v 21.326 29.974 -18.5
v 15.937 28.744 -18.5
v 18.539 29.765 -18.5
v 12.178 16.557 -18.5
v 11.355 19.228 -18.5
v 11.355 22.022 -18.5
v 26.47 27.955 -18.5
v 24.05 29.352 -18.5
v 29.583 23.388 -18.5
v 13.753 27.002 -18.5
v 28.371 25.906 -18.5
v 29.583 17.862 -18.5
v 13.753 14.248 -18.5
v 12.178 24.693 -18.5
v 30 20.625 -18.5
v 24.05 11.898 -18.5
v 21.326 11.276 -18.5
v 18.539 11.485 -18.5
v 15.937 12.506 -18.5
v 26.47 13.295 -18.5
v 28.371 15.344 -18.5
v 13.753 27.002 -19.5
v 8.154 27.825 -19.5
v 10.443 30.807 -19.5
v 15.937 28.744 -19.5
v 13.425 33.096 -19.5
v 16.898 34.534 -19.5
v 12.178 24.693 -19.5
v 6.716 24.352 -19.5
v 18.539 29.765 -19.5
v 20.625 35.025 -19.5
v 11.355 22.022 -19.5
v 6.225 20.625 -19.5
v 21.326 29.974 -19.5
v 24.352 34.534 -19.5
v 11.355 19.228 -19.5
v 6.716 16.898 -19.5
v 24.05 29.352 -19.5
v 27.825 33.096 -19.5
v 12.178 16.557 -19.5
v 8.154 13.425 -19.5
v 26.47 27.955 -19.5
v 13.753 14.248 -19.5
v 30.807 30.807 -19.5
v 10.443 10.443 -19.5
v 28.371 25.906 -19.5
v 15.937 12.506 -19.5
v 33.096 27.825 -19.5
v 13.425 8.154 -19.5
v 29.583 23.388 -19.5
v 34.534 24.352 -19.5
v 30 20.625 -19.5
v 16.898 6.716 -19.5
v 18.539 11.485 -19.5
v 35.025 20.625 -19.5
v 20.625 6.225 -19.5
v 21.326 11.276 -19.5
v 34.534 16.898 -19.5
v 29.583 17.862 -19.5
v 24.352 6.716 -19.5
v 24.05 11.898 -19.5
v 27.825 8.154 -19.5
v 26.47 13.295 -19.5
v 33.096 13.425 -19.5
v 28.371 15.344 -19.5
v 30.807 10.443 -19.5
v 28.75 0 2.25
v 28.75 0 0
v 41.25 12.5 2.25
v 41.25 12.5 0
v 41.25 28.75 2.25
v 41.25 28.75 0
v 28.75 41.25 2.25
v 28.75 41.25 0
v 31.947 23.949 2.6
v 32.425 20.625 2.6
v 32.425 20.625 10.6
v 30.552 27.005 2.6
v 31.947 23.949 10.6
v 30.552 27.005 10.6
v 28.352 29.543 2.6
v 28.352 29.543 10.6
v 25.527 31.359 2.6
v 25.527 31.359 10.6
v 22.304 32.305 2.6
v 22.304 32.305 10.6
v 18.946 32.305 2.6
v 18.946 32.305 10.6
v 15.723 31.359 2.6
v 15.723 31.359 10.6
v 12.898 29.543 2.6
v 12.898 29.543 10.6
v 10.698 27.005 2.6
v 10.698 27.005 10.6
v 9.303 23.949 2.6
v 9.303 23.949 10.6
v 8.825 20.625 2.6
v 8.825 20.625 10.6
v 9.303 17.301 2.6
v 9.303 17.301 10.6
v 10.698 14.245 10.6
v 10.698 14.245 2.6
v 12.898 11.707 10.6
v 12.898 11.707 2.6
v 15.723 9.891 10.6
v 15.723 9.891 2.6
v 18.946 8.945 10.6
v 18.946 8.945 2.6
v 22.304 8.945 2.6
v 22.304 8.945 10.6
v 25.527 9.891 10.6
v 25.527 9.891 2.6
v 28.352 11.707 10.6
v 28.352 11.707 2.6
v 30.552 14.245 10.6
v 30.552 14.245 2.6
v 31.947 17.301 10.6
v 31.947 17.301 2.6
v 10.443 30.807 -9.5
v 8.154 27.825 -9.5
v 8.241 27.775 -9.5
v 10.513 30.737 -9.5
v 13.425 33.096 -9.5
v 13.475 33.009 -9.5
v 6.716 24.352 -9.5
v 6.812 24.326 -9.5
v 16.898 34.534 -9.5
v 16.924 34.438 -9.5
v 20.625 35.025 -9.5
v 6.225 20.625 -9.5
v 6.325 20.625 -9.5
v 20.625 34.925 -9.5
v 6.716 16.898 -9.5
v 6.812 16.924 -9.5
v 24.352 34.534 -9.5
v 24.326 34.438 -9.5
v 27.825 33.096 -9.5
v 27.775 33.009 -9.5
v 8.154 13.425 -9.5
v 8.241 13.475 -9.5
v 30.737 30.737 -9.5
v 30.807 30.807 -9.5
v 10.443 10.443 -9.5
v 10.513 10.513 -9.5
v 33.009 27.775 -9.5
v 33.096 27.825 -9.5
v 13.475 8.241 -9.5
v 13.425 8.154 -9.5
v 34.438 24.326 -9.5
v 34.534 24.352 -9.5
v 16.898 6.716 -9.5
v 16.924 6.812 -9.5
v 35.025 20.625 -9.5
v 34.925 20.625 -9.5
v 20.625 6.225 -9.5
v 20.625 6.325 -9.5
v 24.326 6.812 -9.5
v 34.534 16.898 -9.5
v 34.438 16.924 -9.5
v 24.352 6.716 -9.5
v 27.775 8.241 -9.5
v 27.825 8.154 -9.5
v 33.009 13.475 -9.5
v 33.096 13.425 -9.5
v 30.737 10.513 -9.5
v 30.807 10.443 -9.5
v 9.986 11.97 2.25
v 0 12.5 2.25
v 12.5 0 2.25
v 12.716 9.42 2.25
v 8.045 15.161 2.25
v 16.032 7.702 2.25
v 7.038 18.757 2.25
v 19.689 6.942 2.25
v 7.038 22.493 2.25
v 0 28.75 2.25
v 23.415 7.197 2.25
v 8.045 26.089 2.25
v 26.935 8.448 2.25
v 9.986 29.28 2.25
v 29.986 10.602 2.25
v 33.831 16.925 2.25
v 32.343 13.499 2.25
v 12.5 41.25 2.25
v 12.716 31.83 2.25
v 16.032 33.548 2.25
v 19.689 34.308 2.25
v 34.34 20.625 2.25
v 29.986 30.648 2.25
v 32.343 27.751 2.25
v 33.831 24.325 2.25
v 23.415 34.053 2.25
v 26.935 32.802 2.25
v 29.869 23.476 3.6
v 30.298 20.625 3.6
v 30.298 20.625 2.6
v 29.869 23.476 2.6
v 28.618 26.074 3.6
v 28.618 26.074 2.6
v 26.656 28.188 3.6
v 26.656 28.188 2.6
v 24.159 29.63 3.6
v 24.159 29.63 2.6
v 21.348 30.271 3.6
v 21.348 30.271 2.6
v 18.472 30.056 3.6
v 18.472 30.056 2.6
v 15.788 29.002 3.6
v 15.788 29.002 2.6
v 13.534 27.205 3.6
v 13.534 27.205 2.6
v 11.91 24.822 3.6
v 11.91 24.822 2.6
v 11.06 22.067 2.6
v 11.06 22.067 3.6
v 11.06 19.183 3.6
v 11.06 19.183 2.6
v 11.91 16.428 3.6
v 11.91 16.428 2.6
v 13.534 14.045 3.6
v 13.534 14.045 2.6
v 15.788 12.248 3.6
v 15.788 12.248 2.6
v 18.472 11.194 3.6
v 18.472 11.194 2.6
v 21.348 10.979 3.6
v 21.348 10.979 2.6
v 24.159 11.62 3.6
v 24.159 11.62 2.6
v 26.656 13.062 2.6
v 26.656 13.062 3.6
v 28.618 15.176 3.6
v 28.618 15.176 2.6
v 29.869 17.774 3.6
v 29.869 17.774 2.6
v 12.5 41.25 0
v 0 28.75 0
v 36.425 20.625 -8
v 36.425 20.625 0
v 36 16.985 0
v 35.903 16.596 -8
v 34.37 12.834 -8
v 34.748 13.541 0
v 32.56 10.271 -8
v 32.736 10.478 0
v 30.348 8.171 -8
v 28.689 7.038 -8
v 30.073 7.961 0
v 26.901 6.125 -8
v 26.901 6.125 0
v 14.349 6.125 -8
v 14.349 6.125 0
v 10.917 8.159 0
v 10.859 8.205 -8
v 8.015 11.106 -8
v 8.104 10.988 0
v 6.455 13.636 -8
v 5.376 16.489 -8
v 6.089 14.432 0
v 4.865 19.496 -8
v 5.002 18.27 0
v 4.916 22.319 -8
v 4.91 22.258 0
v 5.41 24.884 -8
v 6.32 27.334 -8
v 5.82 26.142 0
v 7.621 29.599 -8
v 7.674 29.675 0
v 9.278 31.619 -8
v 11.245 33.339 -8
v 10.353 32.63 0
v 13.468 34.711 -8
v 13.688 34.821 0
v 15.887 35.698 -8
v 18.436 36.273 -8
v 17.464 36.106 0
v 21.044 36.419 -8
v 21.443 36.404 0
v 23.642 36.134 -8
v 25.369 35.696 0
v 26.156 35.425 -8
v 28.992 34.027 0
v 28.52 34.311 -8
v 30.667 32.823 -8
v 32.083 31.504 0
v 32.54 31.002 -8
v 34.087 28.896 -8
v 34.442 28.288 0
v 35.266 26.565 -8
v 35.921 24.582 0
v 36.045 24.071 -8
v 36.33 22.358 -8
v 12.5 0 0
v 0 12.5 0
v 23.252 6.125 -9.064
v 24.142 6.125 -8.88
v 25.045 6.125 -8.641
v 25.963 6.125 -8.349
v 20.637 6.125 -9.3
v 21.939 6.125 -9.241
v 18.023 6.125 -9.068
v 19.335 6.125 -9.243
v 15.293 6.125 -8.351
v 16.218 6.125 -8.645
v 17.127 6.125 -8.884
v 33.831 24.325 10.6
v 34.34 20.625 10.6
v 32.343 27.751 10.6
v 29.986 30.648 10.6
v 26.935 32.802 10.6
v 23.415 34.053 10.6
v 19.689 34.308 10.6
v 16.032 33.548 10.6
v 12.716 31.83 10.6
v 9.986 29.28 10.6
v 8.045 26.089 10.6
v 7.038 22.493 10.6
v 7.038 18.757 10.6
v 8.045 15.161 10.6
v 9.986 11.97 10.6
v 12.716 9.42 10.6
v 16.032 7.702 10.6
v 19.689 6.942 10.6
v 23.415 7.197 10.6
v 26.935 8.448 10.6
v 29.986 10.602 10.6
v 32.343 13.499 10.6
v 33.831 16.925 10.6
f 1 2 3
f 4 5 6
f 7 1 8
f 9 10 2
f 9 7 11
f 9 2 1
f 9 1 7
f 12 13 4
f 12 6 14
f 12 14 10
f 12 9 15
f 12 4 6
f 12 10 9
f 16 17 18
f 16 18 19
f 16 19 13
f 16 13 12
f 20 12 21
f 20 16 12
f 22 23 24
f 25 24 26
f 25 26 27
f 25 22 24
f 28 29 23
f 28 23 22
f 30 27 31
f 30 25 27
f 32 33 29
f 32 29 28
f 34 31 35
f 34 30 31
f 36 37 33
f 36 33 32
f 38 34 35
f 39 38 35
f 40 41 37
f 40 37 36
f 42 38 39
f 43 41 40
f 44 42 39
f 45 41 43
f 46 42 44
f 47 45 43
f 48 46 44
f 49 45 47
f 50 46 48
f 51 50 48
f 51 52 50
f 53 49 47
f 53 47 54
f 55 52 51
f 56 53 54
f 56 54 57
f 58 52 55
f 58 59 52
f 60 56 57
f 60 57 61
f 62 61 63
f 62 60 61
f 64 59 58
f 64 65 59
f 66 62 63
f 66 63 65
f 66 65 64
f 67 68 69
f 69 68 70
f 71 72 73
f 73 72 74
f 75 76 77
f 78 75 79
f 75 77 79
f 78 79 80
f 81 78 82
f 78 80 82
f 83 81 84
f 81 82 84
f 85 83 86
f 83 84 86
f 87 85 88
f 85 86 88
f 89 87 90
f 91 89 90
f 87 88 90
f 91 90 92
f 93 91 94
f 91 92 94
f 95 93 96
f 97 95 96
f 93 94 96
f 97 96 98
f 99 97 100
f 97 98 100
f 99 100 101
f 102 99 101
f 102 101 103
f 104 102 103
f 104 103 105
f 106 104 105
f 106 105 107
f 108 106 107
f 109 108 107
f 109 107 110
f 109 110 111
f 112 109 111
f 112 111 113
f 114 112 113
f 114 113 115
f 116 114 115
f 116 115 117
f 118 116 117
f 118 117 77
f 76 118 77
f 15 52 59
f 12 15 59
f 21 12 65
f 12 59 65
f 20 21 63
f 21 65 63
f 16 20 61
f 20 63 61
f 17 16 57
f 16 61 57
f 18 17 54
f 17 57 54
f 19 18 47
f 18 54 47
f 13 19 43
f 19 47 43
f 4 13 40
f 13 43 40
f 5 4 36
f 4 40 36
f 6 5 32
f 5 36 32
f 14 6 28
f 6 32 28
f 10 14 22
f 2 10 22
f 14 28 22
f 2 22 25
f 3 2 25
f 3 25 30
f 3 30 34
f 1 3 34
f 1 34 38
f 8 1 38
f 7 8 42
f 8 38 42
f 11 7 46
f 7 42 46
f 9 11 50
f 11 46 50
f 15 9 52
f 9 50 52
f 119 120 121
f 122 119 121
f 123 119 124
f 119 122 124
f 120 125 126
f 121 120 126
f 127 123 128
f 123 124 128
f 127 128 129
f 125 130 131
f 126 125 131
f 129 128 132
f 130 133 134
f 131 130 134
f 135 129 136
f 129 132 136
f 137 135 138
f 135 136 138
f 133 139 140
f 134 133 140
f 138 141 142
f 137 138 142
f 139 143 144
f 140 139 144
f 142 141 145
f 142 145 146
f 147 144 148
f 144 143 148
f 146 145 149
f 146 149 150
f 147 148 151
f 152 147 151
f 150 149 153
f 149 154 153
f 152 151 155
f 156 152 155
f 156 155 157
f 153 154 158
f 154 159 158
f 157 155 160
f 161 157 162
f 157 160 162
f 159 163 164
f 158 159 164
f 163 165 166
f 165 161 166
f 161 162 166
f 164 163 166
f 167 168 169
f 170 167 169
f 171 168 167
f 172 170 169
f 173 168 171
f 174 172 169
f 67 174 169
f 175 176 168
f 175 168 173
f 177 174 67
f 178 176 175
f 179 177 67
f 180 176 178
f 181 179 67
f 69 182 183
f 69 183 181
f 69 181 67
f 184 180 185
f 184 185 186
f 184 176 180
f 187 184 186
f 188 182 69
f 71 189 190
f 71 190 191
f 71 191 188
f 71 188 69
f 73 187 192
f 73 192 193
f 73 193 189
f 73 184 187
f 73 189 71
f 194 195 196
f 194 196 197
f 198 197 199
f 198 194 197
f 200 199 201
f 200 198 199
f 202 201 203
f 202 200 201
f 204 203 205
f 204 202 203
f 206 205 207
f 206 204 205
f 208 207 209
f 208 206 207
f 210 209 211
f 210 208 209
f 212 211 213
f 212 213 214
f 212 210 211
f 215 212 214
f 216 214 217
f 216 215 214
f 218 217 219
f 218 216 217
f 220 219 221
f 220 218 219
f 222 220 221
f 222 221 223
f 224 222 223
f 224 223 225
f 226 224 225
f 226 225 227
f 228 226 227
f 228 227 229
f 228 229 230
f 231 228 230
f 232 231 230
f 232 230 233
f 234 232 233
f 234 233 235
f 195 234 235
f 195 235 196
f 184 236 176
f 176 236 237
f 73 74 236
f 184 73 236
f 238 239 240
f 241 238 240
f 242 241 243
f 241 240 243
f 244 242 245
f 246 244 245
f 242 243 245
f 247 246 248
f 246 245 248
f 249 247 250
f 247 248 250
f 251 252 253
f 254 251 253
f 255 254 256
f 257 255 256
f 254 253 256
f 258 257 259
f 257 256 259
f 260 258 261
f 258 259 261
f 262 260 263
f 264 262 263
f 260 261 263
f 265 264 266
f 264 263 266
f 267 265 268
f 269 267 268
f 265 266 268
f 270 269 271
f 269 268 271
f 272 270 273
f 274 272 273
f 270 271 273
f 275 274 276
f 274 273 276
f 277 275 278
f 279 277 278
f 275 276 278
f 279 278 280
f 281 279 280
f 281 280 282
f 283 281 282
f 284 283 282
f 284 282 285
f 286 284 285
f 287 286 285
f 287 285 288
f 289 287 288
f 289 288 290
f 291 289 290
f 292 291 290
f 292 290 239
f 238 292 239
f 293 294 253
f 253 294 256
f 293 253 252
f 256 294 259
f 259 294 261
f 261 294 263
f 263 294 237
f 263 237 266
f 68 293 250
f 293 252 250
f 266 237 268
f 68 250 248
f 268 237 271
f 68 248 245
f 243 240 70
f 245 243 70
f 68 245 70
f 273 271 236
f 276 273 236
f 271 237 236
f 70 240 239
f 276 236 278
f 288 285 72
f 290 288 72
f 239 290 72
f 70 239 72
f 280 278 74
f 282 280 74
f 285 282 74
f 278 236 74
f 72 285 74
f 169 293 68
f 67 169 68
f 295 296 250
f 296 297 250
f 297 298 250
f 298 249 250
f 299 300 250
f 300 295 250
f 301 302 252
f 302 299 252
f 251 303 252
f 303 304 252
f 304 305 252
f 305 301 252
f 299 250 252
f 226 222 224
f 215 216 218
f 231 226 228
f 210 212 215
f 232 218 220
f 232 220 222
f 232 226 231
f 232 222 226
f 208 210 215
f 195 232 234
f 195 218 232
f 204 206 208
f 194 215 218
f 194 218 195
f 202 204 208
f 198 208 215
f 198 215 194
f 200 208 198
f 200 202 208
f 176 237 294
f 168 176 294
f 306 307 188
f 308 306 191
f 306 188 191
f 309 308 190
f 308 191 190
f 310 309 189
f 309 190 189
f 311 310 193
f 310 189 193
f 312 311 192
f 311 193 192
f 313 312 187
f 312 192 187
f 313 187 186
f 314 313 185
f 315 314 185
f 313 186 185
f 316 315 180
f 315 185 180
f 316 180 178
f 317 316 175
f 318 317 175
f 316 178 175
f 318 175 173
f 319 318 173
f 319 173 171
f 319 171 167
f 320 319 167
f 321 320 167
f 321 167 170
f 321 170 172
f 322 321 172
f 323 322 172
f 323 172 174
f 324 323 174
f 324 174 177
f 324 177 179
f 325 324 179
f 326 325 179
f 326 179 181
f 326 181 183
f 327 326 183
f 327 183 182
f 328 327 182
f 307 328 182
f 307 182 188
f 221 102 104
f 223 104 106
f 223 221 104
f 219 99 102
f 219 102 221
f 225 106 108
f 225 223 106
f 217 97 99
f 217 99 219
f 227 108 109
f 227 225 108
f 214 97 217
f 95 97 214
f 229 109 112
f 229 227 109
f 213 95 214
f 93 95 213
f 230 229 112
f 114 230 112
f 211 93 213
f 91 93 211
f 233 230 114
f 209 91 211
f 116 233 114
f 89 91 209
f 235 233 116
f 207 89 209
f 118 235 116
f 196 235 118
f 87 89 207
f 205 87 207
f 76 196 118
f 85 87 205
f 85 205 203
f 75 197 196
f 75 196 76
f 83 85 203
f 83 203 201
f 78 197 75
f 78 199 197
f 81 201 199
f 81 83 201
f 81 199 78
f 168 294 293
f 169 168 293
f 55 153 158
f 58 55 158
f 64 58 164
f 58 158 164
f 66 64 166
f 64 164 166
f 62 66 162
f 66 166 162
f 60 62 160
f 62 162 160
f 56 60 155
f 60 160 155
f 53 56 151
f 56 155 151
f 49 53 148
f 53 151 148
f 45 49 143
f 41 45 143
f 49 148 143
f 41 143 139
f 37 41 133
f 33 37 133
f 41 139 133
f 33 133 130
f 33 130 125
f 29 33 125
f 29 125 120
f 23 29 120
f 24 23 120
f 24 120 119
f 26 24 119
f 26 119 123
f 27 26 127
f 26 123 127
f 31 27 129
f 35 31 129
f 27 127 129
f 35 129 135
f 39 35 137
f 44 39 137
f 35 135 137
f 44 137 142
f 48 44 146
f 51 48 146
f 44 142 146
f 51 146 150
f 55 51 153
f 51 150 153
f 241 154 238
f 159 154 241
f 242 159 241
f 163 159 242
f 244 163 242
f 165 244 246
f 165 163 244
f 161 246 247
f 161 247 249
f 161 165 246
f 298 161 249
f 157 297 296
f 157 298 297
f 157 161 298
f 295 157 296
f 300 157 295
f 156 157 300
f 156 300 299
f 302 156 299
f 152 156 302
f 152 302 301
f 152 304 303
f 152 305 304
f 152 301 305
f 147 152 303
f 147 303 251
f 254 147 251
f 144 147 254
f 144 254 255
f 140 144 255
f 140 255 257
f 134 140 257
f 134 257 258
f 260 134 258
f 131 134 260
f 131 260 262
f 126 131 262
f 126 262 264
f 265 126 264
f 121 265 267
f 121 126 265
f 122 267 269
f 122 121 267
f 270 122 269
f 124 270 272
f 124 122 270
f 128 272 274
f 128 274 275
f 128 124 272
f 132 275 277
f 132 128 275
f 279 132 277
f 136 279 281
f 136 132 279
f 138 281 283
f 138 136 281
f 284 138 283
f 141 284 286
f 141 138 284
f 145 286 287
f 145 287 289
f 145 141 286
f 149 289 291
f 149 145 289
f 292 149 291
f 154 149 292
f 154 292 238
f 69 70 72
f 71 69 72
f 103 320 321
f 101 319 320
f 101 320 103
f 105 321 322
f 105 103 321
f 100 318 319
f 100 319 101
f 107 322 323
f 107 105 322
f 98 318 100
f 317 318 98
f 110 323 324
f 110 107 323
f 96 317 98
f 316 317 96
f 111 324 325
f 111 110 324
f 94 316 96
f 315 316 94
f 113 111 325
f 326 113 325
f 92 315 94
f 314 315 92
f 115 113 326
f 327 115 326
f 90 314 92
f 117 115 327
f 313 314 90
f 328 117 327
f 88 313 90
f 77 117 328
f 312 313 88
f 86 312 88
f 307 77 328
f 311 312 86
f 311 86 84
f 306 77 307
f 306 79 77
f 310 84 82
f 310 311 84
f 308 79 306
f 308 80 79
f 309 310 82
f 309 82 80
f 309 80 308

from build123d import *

# Parameters (mm, degrees)
F1_DEPTH    = 2.25
F2_R        = 13.715
F3_DEPTH    = 10.6
F5_DEPTH    = 9.5
F6_T2_ANGLE = 280.2692951884
F6_T4_ANGLE = 100.1752461875
F7_R        = 14.4
F8_DEPTH    = 10
F9_R        = 11.8
F10_DEPTH   = 7
F11_R       = 11.8
F11_R_2     = 9.6734059383
F12_DEPTH   = 8
F13_R       = 9.375
F14_DEPTH   = 1


# Not quite as in the source:
# - a fillet or chamfer that OpenCascade refuses, or shapes differently, is made with other operations: its cross-section is extruded or revolved along the edge and cut away or added


with BuildPart() as f1:
    # F0 (on Top) → F1 (new body)
    with BuildSketch(Plane.XY):
        Polygon((0, 12.5), (12.5, 0), (28.75, 0), (41.25, 12.5), (41.25, 28.75), (28.75, 41.25), (12.5, 41.25), (0, 28.75), align=None)
    extrude(amount=F1_DEPTH)

    # F2 (on Top) → F3 (join)
    with BuildSketch(Plane.XY):
        with Locations((20.625, 20.625)):
            Circle(F2_R)
    extrude(amount=F3_DEPTH)

    # F4 (on face) → F5 (join)
    with BuildSketch(Plane(origin=(0, 0, 0), x_dir=(1, 0, 0), z_dir=(0, 0, -1))):
        with BuildLine():
            ThreePointArc((14.3488546862, -6.125), (11.9509898535, -33.8311178239), (36.425, -20.625))
            ThreePointArc((36.425, -20.625), (33.8311178239, -11.9509898535), (26.9011453138, -6.125))
            Line((26.9011453138, -6.125), (14.3488546862, -6.125))
        make_face()
    extrude(amount=F5_DEPTH)

    # F6: chamfer of 1.5 on 2 edges, made by hand

    # F6_s1 → F6_t2 (revolve, cut)
    with BuildSketch(Plane(origin=(23.5875160096, 4.2735214072, 0), x_dir=(0, 0, 1), z_dir=(0.9839807168, 0.1782749254, 0))):
        with BuildLine():
            Line((-7.9575735931, -0.7752555397), (-9.5424264069, -2.3601083535))
            Line((-9.5424264069, -2.3601083535), (-9.5724264069, -2.3601083535))
            ThreePointArc((-9.5724264069, -2.3601083535), (-9.53, -1.58889515), (-9.53, -0.8176819466))
            Line((-9.53, -0.8176819466), (-9.5, -0.7876819466))
            ThreePointArc((-9.5, -0.7876819466), (-8.7287867966, -0.7876819466), (-7.9575735931, -0.7452555397))
            Line((-7.9575735931, -0.7452555397), (-7.9575735931, -0.7752555397))
        make_face()
    revolve(axis=Axis((20.625, 20.625, -9.5), (0, 0, -1)), revolution_arc=F6_T2_ANGLE, mode=Mode.SUBTRACT)

    # F6_s3 → F6_t4 (revolve, cut)
    with BuildSketch(Plane.XZ.offset(-20.625)):
        with BuildLine():
            Line((36.4674264069, -7.9575735931), (34.8825735931, -9.5424264069))
            Line((34.8825735931, -9.5424264069), (34.8825735931, -9.5724264069))
            ThreePointArc((34.8825735931, -9.5724264069), (35.6537867966, -9.53), (36.425, -9.53))
            Line((36.425, -9.53), (36.455, -9.5))
            ThreePointArc((36.455, -9.5), (36.455, -8.7287867966), (36.4974264069, -7.9575735931))
            Line((36.4974264069, -7.9575735931), (36.4674264069, -7.9575735931))
        make_face()
    revolve(axis=Axis((20.625, 20.625, -9.5), (0, 0, -1)), revolution_arc=F6_T4_ANGLE, mode=Mode.SUBTRACT)

    # F7 (on face) → F8 (join)
    with BuildSketch(Plane(origin=(0, 0, -9.5), x_dir=(1, 0, 0), z_dir=(0, 0, -1))):
        with Locations((20.625, -20.625)):
            Circle(F7_R)
    extrude(amount=F8_DEPTH)

    # F9 (on face) → F10 (cut)
    with BuildSketch(Plane.XY.offset(10.6)):
        with Locations((20.625, 20.625)):
            Circle(F9_R)
    extrude(amount=-F10_DEPTH, mode=Mode.SUBTRACT)

    # F11 (on face) → F12 (cut)
    with BuildSketch(Plane.XY.offset(10.6)):
        with Locations((20.625, 20.625)):
            Circle(F11_R)
        with Locations((20.625, 20.625)):
            Circle(F11_R_2, mode=Mode.SUBTRACT)
    extrude(amount=-F12_DEPTH, mode=Mode.SUBTRACT)

    # F13 (on face) → F14 (cut)
    with BuildSketch(Plane(origin=(0, 0, -19.5), x_dir=(1, 0, 0), z_dir=(0, 0, -1))):
        with Locations((20.625, -20.625)):
            Circle(F13_R)
    extrude(amount=-F14_DEPTH, mode=Mode.SUBTRACT)


solid = f1.part
